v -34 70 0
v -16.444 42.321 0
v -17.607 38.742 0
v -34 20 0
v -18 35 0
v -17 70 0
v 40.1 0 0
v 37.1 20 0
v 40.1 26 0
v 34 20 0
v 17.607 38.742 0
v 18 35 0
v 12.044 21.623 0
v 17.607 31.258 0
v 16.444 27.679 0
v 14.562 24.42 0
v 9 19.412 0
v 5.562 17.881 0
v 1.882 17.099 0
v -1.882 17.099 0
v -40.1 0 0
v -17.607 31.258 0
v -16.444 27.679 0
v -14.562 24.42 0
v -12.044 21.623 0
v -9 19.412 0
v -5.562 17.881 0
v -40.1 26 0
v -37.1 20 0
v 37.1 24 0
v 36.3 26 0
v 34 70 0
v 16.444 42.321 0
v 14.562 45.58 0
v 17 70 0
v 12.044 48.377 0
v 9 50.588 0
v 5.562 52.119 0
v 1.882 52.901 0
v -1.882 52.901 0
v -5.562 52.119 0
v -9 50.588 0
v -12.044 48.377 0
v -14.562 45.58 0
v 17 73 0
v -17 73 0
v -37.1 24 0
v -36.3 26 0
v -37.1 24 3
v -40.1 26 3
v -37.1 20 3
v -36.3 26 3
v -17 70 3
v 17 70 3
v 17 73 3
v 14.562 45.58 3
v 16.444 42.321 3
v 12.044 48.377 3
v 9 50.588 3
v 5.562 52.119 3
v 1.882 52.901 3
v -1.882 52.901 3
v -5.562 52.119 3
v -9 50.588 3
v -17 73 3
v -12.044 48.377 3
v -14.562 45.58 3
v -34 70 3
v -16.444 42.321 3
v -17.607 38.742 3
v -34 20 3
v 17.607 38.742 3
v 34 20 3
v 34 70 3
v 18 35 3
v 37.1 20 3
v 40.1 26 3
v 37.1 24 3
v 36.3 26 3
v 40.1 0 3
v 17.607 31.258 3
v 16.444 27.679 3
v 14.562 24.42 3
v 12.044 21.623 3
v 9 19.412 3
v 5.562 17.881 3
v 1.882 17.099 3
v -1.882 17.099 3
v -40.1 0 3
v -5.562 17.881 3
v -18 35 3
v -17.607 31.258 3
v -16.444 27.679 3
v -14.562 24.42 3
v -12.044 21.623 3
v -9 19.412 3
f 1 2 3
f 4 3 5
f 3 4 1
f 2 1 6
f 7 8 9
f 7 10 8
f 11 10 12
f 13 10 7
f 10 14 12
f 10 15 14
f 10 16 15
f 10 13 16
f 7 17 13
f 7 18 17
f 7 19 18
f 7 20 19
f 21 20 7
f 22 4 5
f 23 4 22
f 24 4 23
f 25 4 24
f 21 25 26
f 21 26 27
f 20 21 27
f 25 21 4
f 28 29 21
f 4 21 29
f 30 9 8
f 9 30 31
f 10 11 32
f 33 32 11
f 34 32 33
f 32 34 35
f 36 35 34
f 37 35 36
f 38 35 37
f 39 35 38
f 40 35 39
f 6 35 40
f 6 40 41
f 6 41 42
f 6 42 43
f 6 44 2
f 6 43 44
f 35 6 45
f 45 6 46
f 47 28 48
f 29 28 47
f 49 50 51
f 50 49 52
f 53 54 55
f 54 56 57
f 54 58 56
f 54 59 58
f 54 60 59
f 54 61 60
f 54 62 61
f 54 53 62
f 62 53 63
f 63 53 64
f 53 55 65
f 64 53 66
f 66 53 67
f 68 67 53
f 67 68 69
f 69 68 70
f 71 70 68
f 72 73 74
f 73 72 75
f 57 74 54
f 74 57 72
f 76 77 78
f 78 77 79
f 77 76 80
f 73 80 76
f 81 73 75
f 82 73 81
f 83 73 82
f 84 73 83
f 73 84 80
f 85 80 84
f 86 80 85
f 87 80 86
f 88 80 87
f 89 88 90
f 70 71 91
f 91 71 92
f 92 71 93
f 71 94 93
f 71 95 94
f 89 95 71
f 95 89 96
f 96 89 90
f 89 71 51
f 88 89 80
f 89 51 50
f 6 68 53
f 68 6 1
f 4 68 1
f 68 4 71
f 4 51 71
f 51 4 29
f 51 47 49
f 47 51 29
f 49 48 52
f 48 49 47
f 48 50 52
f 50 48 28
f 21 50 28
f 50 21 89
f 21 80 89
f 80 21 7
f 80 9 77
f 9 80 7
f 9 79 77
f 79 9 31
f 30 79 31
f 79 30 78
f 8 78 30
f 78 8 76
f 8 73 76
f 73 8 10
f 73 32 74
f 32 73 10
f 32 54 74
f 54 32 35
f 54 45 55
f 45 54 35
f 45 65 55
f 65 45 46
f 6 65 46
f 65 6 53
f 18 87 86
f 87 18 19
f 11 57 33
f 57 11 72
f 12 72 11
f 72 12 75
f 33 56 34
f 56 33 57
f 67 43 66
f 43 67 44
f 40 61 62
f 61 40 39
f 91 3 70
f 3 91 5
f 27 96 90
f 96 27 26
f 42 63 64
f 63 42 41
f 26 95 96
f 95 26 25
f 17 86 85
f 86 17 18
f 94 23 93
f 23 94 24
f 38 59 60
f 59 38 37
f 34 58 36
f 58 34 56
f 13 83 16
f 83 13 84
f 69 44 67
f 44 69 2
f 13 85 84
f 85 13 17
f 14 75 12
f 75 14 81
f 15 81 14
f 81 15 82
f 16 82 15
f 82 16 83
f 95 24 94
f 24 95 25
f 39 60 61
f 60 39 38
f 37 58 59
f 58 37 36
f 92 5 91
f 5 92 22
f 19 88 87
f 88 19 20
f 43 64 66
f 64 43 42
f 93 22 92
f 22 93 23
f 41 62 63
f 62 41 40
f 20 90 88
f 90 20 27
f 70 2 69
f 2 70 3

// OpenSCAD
//Part to make: 1=back, 2=side, 3=bottom
PART_TO_MAKE = 3;

// Total height of the tray, must be greater than 40
TRAY_HEIGHT = 50; 

// width of the card tray, total width will be greater due to TAB_EXCESS_WIDTH
TRAY_WIDTH = 68;

// depth of the card tray, total depth will be greater due to SIDE_OFFSET
TRAY_DEPTH = 70;

// thickness (z direction when printed) of all parts
PARTS_THICKNESS = 3;

// amount of the parts that will overhand the slots.
TAB_EXCESS_WIDTH = 3;

// extra width added to PARTS_THICKNESS for slots 
SIDE_SLOT_TOLERANCE = 0.1;
// extra width add to horizontal slot in back part
BACK_SLOT_TOLERANCE = 0.2;
// save filament by cutting out some of back piece
BACK_CUT_DIAMETER = 26;
// save filament by cutting out some of bottom piece
BOTTOM_CUT_DIAMETER = 36;

// distance from back part to back edge of side part
SIDE_OFFSET = 4;

// Angle of bottom part with respect to ground
BOTTOM_ANGLE = 5;

// DO NOT EDIT, height of top third of back
BACK_TOP_HEIGHT = 20;
// DO NOT EDIT, height of bottom third of back
BACK_BOTTOM_HEIGHT = 20;

// DO NOT EDIT, extent of lower slot on back
BACK_LOWER_SLOT_HEIGHT = 10;
// DO NOT EDIT, extent of upper slot on back
BACK_UPPER_SLOT_HEIGHT = 14;

// DO NOT EDIT, height of horizontal slot on back part
BACK_SLOT_FOR_BOTTOM_HEIGHT = 5;
// DO NOT EDIT, height of horizontal slot on back part
BACK_SLOT_FOR_BOTTOM_LENGTH = TRAY_WIDTH / 2;


// DO NOT EDIT, height of slot on bottom part
BOTTOM_SLOT_HEIGHT = 20;

// DO NOT EDIT, height of tab on bottom part
BOTTOM_TAB_HEIGHT = 6;



/**********************************/


module profile_back_right_half()
{
    middle_height = TRAY_HEIGHT - BACK_TOP_HEIGHT - BACK_BOTTOM_HEIGHT;
    slot_width = SIDE_SLOT_TOLERANCE + PARTS_THICKNESS;

    //bottom third
    square([TRAY_WIDTH/2, BACK_BOTTOM_HEIGHT]);

    //Middle part 
    translate([0,BACK_BOTTOM_HEIGHT,0])
        square([TRAY_WIDTH/2, middle_height]);

    //top third
    translate([0,BACK_BOTTOM_HEIGHT+middle_height,0])
        square([TRAY_WIDTH/2, BACK_TOP_HEIGHT]);
    //bottom hooks
    translate([TRAY_WIDTH/2, BACK_LOWER_SLOT_HEIGHT, 0])
        square([slot_width+TAB_EXCESS_WIDTH,
                BACK_BOTTOM_HEIGHT - BACK_LOWER_SLOT_HEIGHT]);
    translate([TRAY_WIDTH/2 + slot_width, BACK_LOWER_SLOT_HEIGHT-slot_width, 0])
        square([TAB_EXCESS_WIDTH,
                BACK_LOWER_SLOT_HEIGHT - BACK_SLOT_FOR_BOTTOM_HEIGHT]);
    //top hooks
    translate([TRAY_WIDTH/2, TRAY_HEIGHT - BACK_UPPER_SLOT_HEIGHT, 0])
        square([slot_width+TAB_EXCESS_WIDTH,
                 BACK_UPPER_SLOT_HEIGHT]);
    translate([TRAY_WIDTH/2 + slot_width, TRAY_HEIGHT - BACK_TOP_HEIGHT, 0])
        square([TAB_EXCESS_WIDTH,
                BACK_TOP_HEIGHT - BACK_UPPER_SLOT_HEIGHT]);
   
}


module back()
{
    difference()
    {
        linear_extrude(PARTS_THICKNESS)
        {
                profile_back_right_half();
                mirror([1,0,0])
                    profile_back_right_half();
        }
        translate([-(BACK_SLOT_FOR_BOTTOM_LENGTH + BACK_SLOT_TOLERANCE)/2,
                   BACK_SLOT_FOR_BOTTOM_HEIGHT,0])
            cube([BACK_SLOT_FOR_BOTTOM_LENGTH + BACK_SLOT_TOLERANCE , 
                  PARTS_THICKNESS + BACK_SLOT_TOLERANCE, 
                   PARTS_THICKNESS]);
        translate([0,TRAY_HEIGHT/2,0])
            cylinder(h=PARTS_THICKNESS, d=BACK_CUT_DIAMETER);
        
        
    }
}

module side()
{
    slot_width = SIDE_SLOT_TOLERANCE + PARTS_THICKNESS;
    side_depth = TRAY_DEPTH + slot_width + SIDE_OFFSET;
    difference()
    {
        // TRAY_DEPTH will be in x, TRAY_HEIGHT in y
        if (side_depth > TRAY_HEIGHT)
        {
            scale([1, TRAY_HEIGHT/side_depth])
                cylinder(h=PARTS_THICKNESS, d=side_depth*2);
        }
        else
        {
            scale([side_depth/ TRAY_HEIGHT, 1])
                cylinder(h=PARTS_THICKNESS, d=TRAY_HEIGHT*2);
        }
        
        translate([-side_depth,-TRAY_HEIGHT,  0])
            cube([side_depth, TRAY_HEIGHT*2, PARTS_THICKNESS]);
        translate([0,-TRAY_HEIGHT, 0])
            cube([side_depth, TRAY_HEIGHT, PARTS_THICKNESS]);
        // bottom slot
        translate([SIDE_OFFSET, BACK_LOWER_SLOT_HEIGHT, 0])
            cube([slot_width, 
                  BACK_BOTTOM_HEIGHT - BACK_SLOT_FOR_BOTTOM_HEIGHT, 
                  PARTS_THICKNESS]);
        // top slot
        translate([SIDE_OFFSET, 
                   TRAY_HEIGHT-BACK_UPPER_SLOT_HEIGHT, 
                   0])
            cube([slot_width, 
                  TRAY_HEIGHT - BACK_UPPER_SLOT_HEIGHT, 
                  PARTS_THICKNESS]);
        rotate(BOTTOM_ANGLE,[0,0,1])
        {
            //front slot
            translate([side_depth - BOTTOM_SLOT_HEIGHT, 
                       BACK_SLOT_FOR_BOTTOM_HEIGHT, 
                       0])
                cube([BOTTOM_SLOT_HEIGHT, slot_width, PARTS_THICKNESS ]);
            //front tab
            translate([side_depth - BOTTOM_SLOT_HEIGHT - BOTTOM_TAB_HEIGHT,
                       BACK_SLOT_FOR_BOTTOM_HEIGHT, 
                       0])
                cube([3, slot_width, PARTS_THICKNESS ]);
        }
        
    }
}

module profile_bottom_right_half()
{
    slot_width = SIDE_SLOT_TOLERANCE + PARTS_THICKNESS;
    square([TRAY_WIDTH/2, TRAY_DEPTH]);
    translate([0,TRAY_DEPTH, 0])
        square([BACK_SLOT_FOR_BOTTOM_LENGTH/2, PARTS_THICKNESS]);
    translate([TRAY_WIDTH/2, 0, 0])
        square([slot_width, BOTTOM_SLOT_HEIGHT]);
    translate([TRAY_WIDTH/2 + slot_width, 0, 0])
        square([TAB_EXCESS_WIDTH, BOTTOM_SLOT_HEIGHT+BOTTOM_TAB_HEIGHT]);
    translate([TRAY_WIDTH/2 + slot_width, BOTTOM_SLOT_HEIGHT+BOTTOM_TAB_HEIGHT, 0])
        polygon([[0, 0],[-0.8, 0],[0, -2]] );
}

module bottom()
{
    difference()
    {
        linear_extrude(PARTS_THICKNESS)
        {
            profile_bottom_right_half();
            mirror([1,0,0])
                profile_bottom_right_half();
        }
        
        translate([0, TRAY_DEPTH / 2, 0])
            cylinder(h=PARTS_THICKNESS, d=BOTTOM_CUT_DIAMETER);
        
    }
}



/************************************/

if (PART_TO_MAKE == 1)
{
    back();
} 
else if (PART_TO_MAKE == 2)
{
    side();
}
else if (PART_TO_MAKE == 3)
{
    bottom();
}
